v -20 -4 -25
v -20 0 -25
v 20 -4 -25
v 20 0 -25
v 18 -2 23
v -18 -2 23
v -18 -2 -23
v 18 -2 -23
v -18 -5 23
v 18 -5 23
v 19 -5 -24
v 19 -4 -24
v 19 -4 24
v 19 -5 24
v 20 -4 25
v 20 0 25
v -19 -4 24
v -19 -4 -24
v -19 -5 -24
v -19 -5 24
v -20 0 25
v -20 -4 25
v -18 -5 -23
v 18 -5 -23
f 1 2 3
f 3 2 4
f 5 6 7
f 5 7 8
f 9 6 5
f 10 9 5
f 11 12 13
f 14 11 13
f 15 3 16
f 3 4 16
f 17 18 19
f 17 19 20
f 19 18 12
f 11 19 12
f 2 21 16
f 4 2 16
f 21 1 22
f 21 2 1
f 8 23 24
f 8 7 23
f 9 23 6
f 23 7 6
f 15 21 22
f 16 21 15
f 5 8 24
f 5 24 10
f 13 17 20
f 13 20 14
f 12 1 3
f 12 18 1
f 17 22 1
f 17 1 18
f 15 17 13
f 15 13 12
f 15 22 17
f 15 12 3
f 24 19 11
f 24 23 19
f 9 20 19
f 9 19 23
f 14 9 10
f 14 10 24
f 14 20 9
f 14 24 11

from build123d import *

# Parameters (mm, degrees)
F0_W     = 40
F0_H     = 50
F1_DEPTH = 2
F2_W     = 40
F2_H     = 50
F2_W_2   = 36
F2_H_2   = 46
F3_DEPTH = 2
F4_W     = 38
F4_H     = 48
F4_W_2   = 36
F4_H_2   = 46
F5_DEPTH = 1


with BuildPart() as f1:
    # F0 (on Front) → F1 (new body)
    with BuildSketch(Plane.XZ):
        Rectangle(F0_W, F0_H)
    extrude(amount=F1_DEPTH)

    # F2 (on face) → F3 (join)
    with BuildSketch(Plane.XZ.offset(2)):
        Rectangle(F2_W, F2_H)
        Rectangle(F2_W_2, F2_H_2, mode=Mode.SUBTRACT)
    extrude(amount=F3_DEPTH)

    # F4 (on face) → F5 (join)
    with BuildSketch(Plane.XZ.offset(4)):
        Rectangle(F4_W, F4_H)
        Rectangle(F4_W_2, F4_H_2, mode=Mode.SUBTRACT)
    extrude(amount=F5_DEPTH)


solid = f1.part
